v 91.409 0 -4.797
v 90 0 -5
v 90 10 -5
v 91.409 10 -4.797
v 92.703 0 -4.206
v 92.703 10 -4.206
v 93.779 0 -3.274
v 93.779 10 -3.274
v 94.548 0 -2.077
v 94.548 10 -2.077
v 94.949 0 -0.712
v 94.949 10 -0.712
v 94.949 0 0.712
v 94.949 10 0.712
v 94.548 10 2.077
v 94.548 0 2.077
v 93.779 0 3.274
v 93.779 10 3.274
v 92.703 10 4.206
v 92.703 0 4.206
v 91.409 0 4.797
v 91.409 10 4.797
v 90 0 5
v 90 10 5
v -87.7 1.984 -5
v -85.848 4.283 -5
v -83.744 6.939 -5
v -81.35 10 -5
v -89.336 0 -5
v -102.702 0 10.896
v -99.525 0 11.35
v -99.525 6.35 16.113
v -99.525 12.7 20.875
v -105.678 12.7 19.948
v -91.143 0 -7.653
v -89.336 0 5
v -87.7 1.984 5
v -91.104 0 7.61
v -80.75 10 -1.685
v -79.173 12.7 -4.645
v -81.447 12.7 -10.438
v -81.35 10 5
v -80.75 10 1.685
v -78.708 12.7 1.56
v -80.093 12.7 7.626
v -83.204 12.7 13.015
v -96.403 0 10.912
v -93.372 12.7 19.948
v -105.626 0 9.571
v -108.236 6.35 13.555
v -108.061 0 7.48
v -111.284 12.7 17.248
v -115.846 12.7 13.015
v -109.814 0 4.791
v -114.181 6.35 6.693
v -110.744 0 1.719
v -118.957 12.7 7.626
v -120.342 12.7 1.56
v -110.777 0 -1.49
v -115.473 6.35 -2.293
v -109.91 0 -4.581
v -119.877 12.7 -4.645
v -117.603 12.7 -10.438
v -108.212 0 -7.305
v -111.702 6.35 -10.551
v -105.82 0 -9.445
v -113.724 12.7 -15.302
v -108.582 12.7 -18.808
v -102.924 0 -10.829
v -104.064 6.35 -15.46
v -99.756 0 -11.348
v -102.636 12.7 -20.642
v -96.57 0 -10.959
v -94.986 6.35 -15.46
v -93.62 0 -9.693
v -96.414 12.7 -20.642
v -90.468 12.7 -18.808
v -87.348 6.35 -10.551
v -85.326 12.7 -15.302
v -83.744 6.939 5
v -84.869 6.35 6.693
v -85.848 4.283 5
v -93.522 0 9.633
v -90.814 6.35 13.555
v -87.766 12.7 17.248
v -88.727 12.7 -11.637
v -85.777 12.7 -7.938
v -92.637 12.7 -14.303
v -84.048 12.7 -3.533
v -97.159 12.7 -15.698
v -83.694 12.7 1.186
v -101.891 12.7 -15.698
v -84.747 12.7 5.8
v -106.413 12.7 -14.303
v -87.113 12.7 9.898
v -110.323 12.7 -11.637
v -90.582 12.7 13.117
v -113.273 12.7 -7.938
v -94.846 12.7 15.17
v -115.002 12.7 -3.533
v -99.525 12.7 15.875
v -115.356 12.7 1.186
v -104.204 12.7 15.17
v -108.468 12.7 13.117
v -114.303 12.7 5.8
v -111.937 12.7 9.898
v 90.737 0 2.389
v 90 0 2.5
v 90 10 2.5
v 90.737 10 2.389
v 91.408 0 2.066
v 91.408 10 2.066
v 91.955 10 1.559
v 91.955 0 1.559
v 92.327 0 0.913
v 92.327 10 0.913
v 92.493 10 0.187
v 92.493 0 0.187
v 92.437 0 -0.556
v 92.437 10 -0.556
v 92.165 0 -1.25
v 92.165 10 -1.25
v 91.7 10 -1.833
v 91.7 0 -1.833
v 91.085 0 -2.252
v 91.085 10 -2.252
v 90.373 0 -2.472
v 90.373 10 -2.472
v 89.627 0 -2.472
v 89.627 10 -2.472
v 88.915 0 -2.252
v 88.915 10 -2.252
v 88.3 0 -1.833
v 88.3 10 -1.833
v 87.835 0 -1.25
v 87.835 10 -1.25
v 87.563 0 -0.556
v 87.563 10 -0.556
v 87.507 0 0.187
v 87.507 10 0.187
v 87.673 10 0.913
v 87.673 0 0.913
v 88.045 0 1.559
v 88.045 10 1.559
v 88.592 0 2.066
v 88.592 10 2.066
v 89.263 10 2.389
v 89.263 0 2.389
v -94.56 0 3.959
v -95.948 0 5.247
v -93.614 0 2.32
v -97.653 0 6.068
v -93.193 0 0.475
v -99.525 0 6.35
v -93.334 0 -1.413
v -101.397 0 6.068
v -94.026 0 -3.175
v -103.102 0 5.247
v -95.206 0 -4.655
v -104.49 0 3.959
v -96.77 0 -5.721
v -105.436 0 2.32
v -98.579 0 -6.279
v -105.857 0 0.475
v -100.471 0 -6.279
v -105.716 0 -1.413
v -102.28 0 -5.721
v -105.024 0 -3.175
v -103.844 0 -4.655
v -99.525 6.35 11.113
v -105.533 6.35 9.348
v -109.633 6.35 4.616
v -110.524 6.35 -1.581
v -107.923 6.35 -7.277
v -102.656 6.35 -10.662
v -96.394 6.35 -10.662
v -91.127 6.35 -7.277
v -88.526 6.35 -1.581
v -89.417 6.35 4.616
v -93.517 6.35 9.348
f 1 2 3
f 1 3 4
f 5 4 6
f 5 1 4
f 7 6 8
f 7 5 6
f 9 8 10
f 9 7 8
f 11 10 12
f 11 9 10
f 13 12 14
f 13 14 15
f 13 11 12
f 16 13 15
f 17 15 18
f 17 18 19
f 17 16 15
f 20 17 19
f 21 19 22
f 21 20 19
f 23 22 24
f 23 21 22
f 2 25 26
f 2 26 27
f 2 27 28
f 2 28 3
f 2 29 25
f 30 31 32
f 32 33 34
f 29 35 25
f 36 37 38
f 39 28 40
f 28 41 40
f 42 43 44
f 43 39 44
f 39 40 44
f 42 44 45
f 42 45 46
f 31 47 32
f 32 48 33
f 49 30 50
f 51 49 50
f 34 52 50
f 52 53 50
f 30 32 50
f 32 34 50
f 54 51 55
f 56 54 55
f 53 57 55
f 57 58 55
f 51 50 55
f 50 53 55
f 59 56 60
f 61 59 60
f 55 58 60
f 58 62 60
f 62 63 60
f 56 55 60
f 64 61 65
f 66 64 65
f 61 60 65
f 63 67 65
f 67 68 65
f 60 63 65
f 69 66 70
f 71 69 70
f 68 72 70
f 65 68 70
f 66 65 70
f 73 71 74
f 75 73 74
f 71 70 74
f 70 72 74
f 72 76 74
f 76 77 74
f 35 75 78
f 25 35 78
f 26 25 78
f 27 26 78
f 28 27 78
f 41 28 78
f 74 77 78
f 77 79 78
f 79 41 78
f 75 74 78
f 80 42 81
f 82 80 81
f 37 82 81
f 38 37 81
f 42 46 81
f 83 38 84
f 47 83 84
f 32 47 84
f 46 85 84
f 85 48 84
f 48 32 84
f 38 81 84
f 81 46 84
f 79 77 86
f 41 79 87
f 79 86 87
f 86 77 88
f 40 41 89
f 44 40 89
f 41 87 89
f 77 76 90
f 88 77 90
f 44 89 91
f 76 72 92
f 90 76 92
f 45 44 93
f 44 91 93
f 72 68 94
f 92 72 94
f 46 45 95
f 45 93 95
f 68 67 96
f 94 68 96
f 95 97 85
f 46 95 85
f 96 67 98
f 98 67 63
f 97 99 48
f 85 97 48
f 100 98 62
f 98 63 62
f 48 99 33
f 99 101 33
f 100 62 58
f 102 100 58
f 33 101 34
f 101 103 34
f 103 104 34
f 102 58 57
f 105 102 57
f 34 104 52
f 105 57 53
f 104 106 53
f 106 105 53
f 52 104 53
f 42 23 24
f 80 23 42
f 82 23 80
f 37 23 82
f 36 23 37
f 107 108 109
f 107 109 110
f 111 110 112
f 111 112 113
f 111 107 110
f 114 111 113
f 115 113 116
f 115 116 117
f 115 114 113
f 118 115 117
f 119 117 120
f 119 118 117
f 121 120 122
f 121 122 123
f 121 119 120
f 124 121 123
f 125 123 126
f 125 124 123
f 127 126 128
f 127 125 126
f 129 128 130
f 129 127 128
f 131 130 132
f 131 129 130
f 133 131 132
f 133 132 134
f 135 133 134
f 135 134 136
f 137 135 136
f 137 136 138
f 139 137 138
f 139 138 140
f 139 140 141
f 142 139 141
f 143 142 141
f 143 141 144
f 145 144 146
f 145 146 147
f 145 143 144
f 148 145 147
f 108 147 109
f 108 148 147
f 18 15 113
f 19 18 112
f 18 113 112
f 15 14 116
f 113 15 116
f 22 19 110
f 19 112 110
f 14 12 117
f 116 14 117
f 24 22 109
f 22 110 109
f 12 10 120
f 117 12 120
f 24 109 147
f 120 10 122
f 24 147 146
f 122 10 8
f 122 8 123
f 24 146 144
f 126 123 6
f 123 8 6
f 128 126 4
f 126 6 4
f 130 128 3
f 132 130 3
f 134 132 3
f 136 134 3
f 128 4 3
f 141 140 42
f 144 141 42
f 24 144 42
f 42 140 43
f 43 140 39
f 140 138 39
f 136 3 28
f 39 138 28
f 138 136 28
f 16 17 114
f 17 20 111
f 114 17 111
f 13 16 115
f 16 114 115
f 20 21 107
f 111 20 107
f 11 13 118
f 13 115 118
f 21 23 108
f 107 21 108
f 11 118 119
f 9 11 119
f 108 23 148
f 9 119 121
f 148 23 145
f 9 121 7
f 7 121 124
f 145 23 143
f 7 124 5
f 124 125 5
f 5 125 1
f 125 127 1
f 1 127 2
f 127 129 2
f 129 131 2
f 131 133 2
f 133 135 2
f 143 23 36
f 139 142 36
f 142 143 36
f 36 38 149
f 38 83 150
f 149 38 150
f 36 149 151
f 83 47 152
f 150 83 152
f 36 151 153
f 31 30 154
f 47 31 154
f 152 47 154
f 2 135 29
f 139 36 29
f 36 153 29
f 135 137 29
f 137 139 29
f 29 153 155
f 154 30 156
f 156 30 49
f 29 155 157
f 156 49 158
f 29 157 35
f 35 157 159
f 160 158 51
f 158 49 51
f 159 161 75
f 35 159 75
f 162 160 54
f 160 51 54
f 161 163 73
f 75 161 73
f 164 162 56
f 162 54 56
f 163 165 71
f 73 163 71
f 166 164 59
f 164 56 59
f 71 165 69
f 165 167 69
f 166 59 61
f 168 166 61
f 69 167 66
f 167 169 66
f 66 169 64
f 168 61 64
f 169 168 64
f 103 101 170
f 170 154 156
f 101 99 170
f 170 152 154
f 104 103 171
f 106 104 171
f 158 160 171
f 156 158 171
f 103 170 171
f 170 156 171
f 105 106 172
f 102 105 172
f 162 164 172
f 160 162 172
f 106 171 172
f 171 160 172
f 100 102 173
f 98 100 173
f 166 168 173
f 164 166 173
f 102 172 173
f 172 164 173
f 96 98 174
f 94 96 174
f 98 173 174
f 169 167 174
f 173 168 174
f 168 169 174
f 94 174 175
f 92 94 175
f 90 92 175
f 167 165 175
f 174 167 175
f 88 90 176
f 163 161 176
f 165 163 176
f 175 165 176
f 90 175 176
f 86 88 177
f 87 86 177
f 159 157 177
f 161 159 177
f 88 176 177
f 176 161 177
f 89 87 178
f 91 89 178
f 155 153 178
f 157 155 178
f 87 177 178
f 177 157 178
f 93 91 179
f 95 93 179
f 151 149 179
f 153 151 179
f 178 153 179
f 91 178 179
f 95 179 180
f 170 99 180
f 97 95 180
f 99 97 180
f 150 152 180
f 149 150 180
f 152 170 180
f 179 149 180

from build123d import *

# Parameters (mm, degrees)
SKETCH1_R           = 2.5
BOSS_EXTRUDE2_DEPTH = 10


with BuildPart() as part:
    # Sketch1 → Boss-Extrude2 (new body)
    with BuildSketch(Plane(origin=(0, 0, 0), x_dir=(1, 0, 0), z_dir=(0, 1, 0))):
        with BuildLine():
            ThreePointArc((90, 5), (95, 0), (90, -5))
            Line((90, -5), (-90, -5))
            Line((-90, -5), (-90, 5))
            Line((-90, 5), (90, 5))
        make_face()
        with Locations(Location((90, 0, 0), (0, 0, 270))):
            Circle(SKETCH1_R, mode=Mode.SUBTRACT)
    extrude(amount=BOSS_EXTRUDE2_DEPTH)

    # Sketch6 → Revolve2 (revolve)
    with BuildSketch(Plane.XY, mode=Mode.PRIVATE) as revolve2_sk:
        Polygon((-88.175, 0), (-78.65, 12.7), (-83.65, 12.7), (-93.175, 0), align=None)
    revolve(revolve2_sk.sketch.rotate(Axis((-99.525, 14.826221604, 0), (0, -1, 0)), 90), axis=Axis((-99.525, 14.826221604, 0), (0, -1, 0)))

    # Sketch7 → Cut-Revolve1 (revolve, cut)
    with BuildSketch(Plane.XY):
        Polygon((-83.65, 12.7), (-93.175, 0), (-99.525, 0), (-99.525, 12.7), align=None)
    revolve(axis=Axis((-99.525, 12.7, 0), (0, -1, 0)), mode=Mode.SUBTRACT)


solid = part.part
